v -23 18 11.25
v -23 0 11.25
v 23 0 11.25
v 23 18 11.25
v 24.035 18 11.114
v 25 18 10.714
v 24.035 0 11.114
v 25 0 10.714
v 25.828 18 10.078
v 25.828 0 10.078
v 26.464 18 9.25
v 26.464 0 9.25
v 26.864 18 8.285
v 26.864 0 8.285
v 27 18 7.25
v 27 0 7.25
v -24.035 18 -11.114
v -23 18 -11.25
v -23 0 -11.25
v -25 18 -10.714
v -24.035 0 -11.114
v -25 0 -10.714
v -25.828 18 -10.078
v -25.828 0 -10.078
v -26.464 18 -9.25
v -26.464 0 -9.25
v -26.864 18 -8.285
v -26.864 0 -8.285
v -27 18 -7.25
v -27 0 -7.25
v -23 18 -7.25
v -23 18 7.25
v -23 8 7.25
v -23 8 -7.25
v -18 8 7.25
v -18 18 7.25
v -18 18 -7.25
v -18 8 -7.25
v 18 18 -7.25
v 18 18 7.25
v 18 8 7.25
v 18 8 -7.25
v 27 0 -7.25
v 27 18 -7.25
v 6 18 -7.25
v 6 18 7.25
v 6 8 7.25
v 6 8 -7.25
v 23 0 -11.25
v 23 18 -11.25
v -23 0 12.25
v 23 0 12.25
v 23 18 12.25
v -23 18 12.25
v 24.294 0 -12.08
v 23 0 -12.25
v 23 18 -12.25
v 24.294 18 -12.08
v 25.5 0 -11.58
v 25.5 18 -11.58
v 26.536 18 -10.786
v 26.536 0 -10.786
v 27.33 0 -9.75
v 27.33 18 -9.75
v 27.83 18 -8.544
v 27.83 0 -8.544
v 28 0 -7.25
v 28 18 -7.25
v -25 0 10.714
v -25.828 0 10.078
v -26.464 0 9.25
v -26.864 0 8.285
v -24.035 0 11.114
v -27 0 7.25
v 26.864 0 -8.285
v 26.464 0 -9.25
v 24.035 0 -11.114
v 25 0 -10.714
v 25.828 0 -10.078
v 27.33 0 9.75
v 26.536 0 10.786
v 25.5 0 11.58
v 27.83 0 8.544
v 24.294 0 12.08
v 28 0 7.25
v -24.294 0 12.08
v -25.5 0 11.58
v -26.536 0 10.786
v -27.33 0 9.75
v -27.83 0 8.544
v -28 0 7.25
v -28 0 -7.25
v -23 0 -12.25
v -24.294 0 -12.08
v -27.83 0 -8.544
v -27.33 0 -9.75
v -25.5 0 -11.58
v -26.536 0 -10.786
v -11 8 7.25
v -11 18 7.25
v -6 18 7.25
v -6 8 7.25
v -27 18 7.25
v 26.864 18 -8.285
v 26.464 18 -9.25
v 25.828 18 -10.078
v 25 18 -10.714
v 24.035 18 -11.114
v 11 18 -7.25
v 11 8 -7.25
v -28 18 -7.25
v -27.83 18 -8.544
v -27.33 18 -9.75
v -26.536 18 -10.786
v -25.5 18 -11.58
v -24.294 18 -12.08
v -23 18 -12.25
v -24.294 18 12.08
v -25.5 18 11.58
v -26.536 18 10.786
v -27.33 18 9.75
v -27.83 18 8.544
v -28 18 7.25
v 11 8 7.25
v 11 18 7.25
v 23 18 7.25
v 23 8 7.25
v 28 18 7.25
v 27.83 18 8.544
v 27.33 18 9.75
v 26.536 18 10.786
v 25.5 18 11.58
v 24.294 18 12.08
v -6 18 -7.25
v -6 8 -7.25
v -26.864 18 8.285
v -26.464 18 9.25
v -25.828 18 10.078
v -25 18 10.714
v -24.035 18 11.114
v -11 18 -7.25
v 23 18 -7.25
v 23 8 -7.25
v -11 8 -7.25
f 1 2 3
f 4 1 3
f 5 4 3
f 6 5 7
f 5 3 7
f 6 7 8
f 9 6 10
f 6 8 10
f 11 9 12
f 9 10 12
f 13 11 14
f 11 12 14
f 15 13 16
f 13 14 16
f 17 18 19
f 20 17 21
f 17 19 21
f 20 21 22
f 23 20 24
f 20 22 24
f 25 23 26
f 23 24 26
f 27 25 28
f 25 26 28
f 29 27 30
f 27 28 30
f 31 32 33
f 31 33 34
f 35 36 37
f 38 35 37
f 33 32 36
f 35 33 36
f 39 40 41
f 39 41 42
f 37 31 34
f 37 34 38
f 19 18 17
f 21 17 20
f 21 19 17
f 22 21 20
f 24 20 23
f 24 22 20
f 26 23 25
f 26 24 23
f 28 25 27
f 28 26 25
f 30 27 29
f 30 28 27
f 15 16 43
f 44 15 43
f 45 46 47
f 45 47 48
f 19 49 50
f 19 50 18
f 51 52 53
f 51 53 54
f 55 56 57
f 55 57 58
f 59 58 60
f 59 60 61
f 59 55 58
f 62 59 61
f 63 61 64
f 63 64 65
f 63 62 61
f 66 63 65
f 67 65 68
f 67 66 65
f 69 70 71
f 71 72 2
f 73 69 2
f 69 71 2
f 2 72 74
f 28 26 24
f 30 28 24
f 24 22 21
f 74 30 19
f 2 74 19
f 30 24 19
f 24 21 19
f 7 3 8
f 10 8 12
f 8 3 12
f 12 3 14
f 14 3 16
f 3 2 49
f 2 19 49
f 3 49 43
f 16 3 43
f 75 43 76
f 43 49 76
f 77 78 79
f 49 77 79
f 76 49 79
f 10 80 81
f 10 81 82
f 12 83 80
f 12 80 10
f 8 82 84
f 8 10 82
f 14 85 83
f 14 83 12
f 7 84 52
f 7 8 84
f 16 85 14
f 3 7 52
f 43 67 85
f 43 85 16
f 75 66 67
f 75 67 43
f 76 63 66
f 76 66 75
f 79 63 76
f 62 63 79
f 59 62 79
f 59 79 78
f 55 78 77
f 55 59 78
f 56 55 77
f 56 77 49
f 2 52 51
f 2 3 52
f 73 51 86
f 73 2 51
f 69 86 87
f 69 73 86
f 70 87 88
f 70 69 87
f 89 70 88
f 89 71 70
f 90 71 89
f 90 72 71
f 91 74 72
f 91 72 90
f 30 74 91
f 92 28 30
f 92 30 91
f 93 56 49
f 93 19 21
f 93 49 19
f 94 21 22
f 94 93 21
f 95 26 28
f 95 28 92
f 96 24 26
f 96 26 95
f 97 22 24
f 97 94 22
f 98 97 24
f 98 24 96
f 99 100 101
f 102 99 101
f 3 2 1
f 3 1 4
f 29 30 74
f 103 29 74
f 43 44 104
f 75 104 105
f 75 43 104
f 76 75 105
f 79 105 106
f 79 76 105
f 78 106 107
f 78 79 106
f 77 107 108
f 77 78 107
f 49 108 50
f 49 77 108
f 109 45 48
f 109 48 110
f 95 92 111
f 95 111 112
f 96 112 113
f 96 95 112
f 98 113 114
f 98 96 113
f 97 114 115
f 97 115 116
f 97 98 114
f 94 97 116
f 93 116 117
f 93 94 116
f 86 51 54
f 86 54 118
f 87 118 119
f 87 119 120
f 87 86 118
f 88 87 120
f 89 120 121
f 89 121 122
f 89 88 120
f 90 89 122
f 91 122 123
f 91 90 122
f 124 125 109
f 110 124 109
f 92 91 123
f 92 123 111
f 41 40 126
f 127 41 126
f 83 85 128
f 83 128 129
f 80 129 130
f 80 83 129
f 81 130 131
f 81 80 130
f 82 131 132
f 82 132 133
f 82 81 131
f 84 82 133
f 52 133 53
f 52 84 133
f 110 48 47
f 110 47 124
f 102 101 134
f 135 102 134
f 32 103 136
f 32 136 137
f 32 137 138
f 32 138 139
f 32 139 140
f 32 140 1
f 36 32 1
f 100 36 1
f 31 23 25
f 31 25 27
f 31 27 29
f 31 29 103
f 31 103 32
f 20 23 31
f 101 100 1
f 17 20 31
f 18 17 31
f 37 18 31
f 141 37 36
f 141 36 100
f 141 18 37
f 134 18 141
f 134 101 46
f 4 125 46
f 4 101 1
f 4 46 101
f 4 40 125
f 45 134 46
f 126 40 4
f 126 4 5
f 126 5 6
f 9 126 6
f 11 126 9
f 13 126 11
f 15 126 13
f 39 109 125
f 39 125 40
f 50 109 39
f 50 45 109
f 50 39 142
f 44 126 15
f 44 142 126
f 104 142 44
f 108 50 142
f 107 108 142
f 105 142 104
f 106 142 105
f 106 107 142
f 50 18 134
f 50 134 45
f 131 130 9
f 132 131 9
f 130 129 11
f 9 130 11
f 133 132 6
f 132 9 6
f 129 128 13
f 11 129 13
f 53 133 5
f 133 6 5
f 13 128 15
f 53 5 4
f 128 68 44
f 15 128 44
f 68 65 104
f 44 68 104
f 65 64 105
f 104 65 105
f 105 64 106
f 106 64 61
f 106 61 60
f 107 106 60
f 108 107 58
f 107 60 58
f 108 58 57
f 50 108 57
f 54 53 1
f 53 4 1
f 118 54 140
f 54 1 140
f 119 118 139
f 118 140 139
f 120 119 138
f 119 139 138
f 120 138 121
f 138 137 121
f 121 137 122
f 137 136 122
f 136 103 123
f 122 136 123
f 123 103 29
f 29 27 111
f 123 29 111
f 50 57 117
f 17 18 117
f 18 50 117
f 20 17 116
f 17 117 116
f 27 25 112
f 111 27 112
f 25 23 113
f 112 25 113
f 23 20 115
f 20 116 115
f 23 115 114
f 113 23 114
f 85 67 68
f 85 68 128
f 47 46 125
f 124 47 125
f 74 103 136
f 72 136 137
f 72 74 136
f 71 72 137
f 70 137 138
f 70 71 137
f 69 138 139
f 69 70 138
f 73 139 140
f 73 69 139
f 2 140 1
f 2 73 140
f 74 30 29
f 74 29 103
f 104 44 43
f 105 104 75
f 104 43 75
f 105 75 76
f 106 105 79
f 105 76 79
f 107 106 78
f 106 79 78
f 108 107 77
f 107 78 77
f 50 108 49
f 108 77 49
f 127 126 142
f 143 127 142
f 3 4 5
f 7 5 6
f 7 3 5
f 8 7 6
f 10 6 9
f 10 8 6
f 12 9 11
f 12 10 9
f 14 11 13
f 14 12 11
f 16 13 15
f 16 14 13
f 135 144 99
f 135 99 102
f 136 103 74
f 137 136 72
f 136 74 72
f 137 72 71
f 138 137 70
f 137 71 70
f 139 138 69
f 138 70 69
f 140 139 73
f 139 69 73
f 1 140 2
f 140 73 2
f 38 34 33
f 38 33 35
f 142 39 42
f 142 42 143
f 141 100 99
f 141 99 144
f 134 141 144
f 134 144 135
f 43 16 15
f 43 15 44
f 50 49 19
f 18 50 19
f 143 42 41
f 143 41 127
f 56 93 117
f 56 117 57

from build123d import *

# Parameters (mm, degrees)
BOSS_EXTRUDE1_DEPTH = 18
BOSS_EXTRUDE3_DEPTH = 18
CUT_EXTRUDE1_START  = 18
SKETCH2_W           = 5
SKETCH2_H           = 14.5
CUT_EXTRUDE1_DEPTH  = 10


with BuildPart() as part:
    # Sketch1 → Boss-Extrude1 (new body)
    with BuildSketch(Plane(origin=(0, 0, 0), x_dir=(1, 0, 0), z_dir=(0, 1, 0))):
        with BuildLine():
            Line((-23, 12.25), (23, 12.25))
            ThreePointArc((23, 12.25), (26.535533906, 10.785533906), (28, 7.25))
            Line((28, 7.25), (28, -7.25))
            ThreePointArc((28, -7.25), (26.535533906, -10.785533906), (23, -12.25))
            Line((23, -12.25), (-23, -12.25))
            ThreePointArc((-23, -12.25), (-26.535533906, -10.785533906), (-28, -7.25))
            Line((-28, -7.25), (-28, 7.25))
            ThreePointArc((-28, 7.25), (-26.535533906, 10.785533906), (-23, 12.25))
        make_face()
        with BuildLine():
            Line((-27, 7.25), (-27, -7.25))
            ThreePointArc((-27, -7.25), (-25.828427125, -10.078427125), (-23, -11.25))
            Line((-23, -11.25), (23, -11.25))
            ThreePointArc((23, -11.25), (25.828427125, -10.078427125), (27, -7.25))
            Line((27, -7.25), (27, 7.25))
            ThreePointArc((27, 7.25), (25.828427125, 10.078427125), (23, 11.25))
            Line((23, 11.25), (-23, 11.25))
            ThreePointArc((-23, 11.25), (-25.828427125, 10.078427125), (-27, 7.25))
        make_face(mode=Mode.SUBTRACT)
    extrude(amount=BOSS_EXTRUDE1_DEPTH)


with BuildPart() as body_2:
    # Sketch4 → Boss-Extrude3 (new body)
    with BuildSketch(Plane(origin=(0, 0, 0), x_dir=(1, 0, 0), z_dir=(0, 1, 0))):
        with BuildLine():
            Line((27, -7.25), (27, 7.25))
            ThreePointArc((27, 7.25), (25.828427125, 10.078427125), (23, 11.25))
            Line((23, 11.25), (-23, 11.25))
            ThreePointArc((-23, 11.25), (-25.828427125, 10.078427125), (-27, 7.25))
            Line((-27, 7.25), (-27, -7.25))
            ThreePointArc((-27, -7.25), (-25.828427125, -10.078427125), (-23, -11.25))
            Line((-23, -11.25), (23, -11.25))
            ThreePointArc((23, -11.25), (25.828427125, -10.078427125), (27, -7.25))
        make_face()
    extrude(amount=BOSS_EXTRUDE3_DEPTH)

    # Sketch2 → Cut-Extrude1 (cut)
    with BuildSketch(Plane(origin=(0, 0, 0), x_dir=(1, 0, 0), z_dir=(0, 1, 0)).offset(CUT_EXTRUDE1_START)):
        with Locations((-20.5, 0)):
            Rectangle(SKETCH2_W, SKETCH2_H)
        with Locations((-8.5, 0)):
            Rectangle(SKETCH2_W, SKETCH2_H)
        with Locations((20.5, 0)):
            Rectangle(SKETCH2_W, SKETCH2_H)
        with Locations((8.5, 0)):
            Rectangle(SKETCH2_W, SKETCH2_H)
    extrude(amount=-CUT_EXTRUDE1_DEPTH, mode=Mode.SUBTRACT)


solid = Compound([part.part, body_2.part])
